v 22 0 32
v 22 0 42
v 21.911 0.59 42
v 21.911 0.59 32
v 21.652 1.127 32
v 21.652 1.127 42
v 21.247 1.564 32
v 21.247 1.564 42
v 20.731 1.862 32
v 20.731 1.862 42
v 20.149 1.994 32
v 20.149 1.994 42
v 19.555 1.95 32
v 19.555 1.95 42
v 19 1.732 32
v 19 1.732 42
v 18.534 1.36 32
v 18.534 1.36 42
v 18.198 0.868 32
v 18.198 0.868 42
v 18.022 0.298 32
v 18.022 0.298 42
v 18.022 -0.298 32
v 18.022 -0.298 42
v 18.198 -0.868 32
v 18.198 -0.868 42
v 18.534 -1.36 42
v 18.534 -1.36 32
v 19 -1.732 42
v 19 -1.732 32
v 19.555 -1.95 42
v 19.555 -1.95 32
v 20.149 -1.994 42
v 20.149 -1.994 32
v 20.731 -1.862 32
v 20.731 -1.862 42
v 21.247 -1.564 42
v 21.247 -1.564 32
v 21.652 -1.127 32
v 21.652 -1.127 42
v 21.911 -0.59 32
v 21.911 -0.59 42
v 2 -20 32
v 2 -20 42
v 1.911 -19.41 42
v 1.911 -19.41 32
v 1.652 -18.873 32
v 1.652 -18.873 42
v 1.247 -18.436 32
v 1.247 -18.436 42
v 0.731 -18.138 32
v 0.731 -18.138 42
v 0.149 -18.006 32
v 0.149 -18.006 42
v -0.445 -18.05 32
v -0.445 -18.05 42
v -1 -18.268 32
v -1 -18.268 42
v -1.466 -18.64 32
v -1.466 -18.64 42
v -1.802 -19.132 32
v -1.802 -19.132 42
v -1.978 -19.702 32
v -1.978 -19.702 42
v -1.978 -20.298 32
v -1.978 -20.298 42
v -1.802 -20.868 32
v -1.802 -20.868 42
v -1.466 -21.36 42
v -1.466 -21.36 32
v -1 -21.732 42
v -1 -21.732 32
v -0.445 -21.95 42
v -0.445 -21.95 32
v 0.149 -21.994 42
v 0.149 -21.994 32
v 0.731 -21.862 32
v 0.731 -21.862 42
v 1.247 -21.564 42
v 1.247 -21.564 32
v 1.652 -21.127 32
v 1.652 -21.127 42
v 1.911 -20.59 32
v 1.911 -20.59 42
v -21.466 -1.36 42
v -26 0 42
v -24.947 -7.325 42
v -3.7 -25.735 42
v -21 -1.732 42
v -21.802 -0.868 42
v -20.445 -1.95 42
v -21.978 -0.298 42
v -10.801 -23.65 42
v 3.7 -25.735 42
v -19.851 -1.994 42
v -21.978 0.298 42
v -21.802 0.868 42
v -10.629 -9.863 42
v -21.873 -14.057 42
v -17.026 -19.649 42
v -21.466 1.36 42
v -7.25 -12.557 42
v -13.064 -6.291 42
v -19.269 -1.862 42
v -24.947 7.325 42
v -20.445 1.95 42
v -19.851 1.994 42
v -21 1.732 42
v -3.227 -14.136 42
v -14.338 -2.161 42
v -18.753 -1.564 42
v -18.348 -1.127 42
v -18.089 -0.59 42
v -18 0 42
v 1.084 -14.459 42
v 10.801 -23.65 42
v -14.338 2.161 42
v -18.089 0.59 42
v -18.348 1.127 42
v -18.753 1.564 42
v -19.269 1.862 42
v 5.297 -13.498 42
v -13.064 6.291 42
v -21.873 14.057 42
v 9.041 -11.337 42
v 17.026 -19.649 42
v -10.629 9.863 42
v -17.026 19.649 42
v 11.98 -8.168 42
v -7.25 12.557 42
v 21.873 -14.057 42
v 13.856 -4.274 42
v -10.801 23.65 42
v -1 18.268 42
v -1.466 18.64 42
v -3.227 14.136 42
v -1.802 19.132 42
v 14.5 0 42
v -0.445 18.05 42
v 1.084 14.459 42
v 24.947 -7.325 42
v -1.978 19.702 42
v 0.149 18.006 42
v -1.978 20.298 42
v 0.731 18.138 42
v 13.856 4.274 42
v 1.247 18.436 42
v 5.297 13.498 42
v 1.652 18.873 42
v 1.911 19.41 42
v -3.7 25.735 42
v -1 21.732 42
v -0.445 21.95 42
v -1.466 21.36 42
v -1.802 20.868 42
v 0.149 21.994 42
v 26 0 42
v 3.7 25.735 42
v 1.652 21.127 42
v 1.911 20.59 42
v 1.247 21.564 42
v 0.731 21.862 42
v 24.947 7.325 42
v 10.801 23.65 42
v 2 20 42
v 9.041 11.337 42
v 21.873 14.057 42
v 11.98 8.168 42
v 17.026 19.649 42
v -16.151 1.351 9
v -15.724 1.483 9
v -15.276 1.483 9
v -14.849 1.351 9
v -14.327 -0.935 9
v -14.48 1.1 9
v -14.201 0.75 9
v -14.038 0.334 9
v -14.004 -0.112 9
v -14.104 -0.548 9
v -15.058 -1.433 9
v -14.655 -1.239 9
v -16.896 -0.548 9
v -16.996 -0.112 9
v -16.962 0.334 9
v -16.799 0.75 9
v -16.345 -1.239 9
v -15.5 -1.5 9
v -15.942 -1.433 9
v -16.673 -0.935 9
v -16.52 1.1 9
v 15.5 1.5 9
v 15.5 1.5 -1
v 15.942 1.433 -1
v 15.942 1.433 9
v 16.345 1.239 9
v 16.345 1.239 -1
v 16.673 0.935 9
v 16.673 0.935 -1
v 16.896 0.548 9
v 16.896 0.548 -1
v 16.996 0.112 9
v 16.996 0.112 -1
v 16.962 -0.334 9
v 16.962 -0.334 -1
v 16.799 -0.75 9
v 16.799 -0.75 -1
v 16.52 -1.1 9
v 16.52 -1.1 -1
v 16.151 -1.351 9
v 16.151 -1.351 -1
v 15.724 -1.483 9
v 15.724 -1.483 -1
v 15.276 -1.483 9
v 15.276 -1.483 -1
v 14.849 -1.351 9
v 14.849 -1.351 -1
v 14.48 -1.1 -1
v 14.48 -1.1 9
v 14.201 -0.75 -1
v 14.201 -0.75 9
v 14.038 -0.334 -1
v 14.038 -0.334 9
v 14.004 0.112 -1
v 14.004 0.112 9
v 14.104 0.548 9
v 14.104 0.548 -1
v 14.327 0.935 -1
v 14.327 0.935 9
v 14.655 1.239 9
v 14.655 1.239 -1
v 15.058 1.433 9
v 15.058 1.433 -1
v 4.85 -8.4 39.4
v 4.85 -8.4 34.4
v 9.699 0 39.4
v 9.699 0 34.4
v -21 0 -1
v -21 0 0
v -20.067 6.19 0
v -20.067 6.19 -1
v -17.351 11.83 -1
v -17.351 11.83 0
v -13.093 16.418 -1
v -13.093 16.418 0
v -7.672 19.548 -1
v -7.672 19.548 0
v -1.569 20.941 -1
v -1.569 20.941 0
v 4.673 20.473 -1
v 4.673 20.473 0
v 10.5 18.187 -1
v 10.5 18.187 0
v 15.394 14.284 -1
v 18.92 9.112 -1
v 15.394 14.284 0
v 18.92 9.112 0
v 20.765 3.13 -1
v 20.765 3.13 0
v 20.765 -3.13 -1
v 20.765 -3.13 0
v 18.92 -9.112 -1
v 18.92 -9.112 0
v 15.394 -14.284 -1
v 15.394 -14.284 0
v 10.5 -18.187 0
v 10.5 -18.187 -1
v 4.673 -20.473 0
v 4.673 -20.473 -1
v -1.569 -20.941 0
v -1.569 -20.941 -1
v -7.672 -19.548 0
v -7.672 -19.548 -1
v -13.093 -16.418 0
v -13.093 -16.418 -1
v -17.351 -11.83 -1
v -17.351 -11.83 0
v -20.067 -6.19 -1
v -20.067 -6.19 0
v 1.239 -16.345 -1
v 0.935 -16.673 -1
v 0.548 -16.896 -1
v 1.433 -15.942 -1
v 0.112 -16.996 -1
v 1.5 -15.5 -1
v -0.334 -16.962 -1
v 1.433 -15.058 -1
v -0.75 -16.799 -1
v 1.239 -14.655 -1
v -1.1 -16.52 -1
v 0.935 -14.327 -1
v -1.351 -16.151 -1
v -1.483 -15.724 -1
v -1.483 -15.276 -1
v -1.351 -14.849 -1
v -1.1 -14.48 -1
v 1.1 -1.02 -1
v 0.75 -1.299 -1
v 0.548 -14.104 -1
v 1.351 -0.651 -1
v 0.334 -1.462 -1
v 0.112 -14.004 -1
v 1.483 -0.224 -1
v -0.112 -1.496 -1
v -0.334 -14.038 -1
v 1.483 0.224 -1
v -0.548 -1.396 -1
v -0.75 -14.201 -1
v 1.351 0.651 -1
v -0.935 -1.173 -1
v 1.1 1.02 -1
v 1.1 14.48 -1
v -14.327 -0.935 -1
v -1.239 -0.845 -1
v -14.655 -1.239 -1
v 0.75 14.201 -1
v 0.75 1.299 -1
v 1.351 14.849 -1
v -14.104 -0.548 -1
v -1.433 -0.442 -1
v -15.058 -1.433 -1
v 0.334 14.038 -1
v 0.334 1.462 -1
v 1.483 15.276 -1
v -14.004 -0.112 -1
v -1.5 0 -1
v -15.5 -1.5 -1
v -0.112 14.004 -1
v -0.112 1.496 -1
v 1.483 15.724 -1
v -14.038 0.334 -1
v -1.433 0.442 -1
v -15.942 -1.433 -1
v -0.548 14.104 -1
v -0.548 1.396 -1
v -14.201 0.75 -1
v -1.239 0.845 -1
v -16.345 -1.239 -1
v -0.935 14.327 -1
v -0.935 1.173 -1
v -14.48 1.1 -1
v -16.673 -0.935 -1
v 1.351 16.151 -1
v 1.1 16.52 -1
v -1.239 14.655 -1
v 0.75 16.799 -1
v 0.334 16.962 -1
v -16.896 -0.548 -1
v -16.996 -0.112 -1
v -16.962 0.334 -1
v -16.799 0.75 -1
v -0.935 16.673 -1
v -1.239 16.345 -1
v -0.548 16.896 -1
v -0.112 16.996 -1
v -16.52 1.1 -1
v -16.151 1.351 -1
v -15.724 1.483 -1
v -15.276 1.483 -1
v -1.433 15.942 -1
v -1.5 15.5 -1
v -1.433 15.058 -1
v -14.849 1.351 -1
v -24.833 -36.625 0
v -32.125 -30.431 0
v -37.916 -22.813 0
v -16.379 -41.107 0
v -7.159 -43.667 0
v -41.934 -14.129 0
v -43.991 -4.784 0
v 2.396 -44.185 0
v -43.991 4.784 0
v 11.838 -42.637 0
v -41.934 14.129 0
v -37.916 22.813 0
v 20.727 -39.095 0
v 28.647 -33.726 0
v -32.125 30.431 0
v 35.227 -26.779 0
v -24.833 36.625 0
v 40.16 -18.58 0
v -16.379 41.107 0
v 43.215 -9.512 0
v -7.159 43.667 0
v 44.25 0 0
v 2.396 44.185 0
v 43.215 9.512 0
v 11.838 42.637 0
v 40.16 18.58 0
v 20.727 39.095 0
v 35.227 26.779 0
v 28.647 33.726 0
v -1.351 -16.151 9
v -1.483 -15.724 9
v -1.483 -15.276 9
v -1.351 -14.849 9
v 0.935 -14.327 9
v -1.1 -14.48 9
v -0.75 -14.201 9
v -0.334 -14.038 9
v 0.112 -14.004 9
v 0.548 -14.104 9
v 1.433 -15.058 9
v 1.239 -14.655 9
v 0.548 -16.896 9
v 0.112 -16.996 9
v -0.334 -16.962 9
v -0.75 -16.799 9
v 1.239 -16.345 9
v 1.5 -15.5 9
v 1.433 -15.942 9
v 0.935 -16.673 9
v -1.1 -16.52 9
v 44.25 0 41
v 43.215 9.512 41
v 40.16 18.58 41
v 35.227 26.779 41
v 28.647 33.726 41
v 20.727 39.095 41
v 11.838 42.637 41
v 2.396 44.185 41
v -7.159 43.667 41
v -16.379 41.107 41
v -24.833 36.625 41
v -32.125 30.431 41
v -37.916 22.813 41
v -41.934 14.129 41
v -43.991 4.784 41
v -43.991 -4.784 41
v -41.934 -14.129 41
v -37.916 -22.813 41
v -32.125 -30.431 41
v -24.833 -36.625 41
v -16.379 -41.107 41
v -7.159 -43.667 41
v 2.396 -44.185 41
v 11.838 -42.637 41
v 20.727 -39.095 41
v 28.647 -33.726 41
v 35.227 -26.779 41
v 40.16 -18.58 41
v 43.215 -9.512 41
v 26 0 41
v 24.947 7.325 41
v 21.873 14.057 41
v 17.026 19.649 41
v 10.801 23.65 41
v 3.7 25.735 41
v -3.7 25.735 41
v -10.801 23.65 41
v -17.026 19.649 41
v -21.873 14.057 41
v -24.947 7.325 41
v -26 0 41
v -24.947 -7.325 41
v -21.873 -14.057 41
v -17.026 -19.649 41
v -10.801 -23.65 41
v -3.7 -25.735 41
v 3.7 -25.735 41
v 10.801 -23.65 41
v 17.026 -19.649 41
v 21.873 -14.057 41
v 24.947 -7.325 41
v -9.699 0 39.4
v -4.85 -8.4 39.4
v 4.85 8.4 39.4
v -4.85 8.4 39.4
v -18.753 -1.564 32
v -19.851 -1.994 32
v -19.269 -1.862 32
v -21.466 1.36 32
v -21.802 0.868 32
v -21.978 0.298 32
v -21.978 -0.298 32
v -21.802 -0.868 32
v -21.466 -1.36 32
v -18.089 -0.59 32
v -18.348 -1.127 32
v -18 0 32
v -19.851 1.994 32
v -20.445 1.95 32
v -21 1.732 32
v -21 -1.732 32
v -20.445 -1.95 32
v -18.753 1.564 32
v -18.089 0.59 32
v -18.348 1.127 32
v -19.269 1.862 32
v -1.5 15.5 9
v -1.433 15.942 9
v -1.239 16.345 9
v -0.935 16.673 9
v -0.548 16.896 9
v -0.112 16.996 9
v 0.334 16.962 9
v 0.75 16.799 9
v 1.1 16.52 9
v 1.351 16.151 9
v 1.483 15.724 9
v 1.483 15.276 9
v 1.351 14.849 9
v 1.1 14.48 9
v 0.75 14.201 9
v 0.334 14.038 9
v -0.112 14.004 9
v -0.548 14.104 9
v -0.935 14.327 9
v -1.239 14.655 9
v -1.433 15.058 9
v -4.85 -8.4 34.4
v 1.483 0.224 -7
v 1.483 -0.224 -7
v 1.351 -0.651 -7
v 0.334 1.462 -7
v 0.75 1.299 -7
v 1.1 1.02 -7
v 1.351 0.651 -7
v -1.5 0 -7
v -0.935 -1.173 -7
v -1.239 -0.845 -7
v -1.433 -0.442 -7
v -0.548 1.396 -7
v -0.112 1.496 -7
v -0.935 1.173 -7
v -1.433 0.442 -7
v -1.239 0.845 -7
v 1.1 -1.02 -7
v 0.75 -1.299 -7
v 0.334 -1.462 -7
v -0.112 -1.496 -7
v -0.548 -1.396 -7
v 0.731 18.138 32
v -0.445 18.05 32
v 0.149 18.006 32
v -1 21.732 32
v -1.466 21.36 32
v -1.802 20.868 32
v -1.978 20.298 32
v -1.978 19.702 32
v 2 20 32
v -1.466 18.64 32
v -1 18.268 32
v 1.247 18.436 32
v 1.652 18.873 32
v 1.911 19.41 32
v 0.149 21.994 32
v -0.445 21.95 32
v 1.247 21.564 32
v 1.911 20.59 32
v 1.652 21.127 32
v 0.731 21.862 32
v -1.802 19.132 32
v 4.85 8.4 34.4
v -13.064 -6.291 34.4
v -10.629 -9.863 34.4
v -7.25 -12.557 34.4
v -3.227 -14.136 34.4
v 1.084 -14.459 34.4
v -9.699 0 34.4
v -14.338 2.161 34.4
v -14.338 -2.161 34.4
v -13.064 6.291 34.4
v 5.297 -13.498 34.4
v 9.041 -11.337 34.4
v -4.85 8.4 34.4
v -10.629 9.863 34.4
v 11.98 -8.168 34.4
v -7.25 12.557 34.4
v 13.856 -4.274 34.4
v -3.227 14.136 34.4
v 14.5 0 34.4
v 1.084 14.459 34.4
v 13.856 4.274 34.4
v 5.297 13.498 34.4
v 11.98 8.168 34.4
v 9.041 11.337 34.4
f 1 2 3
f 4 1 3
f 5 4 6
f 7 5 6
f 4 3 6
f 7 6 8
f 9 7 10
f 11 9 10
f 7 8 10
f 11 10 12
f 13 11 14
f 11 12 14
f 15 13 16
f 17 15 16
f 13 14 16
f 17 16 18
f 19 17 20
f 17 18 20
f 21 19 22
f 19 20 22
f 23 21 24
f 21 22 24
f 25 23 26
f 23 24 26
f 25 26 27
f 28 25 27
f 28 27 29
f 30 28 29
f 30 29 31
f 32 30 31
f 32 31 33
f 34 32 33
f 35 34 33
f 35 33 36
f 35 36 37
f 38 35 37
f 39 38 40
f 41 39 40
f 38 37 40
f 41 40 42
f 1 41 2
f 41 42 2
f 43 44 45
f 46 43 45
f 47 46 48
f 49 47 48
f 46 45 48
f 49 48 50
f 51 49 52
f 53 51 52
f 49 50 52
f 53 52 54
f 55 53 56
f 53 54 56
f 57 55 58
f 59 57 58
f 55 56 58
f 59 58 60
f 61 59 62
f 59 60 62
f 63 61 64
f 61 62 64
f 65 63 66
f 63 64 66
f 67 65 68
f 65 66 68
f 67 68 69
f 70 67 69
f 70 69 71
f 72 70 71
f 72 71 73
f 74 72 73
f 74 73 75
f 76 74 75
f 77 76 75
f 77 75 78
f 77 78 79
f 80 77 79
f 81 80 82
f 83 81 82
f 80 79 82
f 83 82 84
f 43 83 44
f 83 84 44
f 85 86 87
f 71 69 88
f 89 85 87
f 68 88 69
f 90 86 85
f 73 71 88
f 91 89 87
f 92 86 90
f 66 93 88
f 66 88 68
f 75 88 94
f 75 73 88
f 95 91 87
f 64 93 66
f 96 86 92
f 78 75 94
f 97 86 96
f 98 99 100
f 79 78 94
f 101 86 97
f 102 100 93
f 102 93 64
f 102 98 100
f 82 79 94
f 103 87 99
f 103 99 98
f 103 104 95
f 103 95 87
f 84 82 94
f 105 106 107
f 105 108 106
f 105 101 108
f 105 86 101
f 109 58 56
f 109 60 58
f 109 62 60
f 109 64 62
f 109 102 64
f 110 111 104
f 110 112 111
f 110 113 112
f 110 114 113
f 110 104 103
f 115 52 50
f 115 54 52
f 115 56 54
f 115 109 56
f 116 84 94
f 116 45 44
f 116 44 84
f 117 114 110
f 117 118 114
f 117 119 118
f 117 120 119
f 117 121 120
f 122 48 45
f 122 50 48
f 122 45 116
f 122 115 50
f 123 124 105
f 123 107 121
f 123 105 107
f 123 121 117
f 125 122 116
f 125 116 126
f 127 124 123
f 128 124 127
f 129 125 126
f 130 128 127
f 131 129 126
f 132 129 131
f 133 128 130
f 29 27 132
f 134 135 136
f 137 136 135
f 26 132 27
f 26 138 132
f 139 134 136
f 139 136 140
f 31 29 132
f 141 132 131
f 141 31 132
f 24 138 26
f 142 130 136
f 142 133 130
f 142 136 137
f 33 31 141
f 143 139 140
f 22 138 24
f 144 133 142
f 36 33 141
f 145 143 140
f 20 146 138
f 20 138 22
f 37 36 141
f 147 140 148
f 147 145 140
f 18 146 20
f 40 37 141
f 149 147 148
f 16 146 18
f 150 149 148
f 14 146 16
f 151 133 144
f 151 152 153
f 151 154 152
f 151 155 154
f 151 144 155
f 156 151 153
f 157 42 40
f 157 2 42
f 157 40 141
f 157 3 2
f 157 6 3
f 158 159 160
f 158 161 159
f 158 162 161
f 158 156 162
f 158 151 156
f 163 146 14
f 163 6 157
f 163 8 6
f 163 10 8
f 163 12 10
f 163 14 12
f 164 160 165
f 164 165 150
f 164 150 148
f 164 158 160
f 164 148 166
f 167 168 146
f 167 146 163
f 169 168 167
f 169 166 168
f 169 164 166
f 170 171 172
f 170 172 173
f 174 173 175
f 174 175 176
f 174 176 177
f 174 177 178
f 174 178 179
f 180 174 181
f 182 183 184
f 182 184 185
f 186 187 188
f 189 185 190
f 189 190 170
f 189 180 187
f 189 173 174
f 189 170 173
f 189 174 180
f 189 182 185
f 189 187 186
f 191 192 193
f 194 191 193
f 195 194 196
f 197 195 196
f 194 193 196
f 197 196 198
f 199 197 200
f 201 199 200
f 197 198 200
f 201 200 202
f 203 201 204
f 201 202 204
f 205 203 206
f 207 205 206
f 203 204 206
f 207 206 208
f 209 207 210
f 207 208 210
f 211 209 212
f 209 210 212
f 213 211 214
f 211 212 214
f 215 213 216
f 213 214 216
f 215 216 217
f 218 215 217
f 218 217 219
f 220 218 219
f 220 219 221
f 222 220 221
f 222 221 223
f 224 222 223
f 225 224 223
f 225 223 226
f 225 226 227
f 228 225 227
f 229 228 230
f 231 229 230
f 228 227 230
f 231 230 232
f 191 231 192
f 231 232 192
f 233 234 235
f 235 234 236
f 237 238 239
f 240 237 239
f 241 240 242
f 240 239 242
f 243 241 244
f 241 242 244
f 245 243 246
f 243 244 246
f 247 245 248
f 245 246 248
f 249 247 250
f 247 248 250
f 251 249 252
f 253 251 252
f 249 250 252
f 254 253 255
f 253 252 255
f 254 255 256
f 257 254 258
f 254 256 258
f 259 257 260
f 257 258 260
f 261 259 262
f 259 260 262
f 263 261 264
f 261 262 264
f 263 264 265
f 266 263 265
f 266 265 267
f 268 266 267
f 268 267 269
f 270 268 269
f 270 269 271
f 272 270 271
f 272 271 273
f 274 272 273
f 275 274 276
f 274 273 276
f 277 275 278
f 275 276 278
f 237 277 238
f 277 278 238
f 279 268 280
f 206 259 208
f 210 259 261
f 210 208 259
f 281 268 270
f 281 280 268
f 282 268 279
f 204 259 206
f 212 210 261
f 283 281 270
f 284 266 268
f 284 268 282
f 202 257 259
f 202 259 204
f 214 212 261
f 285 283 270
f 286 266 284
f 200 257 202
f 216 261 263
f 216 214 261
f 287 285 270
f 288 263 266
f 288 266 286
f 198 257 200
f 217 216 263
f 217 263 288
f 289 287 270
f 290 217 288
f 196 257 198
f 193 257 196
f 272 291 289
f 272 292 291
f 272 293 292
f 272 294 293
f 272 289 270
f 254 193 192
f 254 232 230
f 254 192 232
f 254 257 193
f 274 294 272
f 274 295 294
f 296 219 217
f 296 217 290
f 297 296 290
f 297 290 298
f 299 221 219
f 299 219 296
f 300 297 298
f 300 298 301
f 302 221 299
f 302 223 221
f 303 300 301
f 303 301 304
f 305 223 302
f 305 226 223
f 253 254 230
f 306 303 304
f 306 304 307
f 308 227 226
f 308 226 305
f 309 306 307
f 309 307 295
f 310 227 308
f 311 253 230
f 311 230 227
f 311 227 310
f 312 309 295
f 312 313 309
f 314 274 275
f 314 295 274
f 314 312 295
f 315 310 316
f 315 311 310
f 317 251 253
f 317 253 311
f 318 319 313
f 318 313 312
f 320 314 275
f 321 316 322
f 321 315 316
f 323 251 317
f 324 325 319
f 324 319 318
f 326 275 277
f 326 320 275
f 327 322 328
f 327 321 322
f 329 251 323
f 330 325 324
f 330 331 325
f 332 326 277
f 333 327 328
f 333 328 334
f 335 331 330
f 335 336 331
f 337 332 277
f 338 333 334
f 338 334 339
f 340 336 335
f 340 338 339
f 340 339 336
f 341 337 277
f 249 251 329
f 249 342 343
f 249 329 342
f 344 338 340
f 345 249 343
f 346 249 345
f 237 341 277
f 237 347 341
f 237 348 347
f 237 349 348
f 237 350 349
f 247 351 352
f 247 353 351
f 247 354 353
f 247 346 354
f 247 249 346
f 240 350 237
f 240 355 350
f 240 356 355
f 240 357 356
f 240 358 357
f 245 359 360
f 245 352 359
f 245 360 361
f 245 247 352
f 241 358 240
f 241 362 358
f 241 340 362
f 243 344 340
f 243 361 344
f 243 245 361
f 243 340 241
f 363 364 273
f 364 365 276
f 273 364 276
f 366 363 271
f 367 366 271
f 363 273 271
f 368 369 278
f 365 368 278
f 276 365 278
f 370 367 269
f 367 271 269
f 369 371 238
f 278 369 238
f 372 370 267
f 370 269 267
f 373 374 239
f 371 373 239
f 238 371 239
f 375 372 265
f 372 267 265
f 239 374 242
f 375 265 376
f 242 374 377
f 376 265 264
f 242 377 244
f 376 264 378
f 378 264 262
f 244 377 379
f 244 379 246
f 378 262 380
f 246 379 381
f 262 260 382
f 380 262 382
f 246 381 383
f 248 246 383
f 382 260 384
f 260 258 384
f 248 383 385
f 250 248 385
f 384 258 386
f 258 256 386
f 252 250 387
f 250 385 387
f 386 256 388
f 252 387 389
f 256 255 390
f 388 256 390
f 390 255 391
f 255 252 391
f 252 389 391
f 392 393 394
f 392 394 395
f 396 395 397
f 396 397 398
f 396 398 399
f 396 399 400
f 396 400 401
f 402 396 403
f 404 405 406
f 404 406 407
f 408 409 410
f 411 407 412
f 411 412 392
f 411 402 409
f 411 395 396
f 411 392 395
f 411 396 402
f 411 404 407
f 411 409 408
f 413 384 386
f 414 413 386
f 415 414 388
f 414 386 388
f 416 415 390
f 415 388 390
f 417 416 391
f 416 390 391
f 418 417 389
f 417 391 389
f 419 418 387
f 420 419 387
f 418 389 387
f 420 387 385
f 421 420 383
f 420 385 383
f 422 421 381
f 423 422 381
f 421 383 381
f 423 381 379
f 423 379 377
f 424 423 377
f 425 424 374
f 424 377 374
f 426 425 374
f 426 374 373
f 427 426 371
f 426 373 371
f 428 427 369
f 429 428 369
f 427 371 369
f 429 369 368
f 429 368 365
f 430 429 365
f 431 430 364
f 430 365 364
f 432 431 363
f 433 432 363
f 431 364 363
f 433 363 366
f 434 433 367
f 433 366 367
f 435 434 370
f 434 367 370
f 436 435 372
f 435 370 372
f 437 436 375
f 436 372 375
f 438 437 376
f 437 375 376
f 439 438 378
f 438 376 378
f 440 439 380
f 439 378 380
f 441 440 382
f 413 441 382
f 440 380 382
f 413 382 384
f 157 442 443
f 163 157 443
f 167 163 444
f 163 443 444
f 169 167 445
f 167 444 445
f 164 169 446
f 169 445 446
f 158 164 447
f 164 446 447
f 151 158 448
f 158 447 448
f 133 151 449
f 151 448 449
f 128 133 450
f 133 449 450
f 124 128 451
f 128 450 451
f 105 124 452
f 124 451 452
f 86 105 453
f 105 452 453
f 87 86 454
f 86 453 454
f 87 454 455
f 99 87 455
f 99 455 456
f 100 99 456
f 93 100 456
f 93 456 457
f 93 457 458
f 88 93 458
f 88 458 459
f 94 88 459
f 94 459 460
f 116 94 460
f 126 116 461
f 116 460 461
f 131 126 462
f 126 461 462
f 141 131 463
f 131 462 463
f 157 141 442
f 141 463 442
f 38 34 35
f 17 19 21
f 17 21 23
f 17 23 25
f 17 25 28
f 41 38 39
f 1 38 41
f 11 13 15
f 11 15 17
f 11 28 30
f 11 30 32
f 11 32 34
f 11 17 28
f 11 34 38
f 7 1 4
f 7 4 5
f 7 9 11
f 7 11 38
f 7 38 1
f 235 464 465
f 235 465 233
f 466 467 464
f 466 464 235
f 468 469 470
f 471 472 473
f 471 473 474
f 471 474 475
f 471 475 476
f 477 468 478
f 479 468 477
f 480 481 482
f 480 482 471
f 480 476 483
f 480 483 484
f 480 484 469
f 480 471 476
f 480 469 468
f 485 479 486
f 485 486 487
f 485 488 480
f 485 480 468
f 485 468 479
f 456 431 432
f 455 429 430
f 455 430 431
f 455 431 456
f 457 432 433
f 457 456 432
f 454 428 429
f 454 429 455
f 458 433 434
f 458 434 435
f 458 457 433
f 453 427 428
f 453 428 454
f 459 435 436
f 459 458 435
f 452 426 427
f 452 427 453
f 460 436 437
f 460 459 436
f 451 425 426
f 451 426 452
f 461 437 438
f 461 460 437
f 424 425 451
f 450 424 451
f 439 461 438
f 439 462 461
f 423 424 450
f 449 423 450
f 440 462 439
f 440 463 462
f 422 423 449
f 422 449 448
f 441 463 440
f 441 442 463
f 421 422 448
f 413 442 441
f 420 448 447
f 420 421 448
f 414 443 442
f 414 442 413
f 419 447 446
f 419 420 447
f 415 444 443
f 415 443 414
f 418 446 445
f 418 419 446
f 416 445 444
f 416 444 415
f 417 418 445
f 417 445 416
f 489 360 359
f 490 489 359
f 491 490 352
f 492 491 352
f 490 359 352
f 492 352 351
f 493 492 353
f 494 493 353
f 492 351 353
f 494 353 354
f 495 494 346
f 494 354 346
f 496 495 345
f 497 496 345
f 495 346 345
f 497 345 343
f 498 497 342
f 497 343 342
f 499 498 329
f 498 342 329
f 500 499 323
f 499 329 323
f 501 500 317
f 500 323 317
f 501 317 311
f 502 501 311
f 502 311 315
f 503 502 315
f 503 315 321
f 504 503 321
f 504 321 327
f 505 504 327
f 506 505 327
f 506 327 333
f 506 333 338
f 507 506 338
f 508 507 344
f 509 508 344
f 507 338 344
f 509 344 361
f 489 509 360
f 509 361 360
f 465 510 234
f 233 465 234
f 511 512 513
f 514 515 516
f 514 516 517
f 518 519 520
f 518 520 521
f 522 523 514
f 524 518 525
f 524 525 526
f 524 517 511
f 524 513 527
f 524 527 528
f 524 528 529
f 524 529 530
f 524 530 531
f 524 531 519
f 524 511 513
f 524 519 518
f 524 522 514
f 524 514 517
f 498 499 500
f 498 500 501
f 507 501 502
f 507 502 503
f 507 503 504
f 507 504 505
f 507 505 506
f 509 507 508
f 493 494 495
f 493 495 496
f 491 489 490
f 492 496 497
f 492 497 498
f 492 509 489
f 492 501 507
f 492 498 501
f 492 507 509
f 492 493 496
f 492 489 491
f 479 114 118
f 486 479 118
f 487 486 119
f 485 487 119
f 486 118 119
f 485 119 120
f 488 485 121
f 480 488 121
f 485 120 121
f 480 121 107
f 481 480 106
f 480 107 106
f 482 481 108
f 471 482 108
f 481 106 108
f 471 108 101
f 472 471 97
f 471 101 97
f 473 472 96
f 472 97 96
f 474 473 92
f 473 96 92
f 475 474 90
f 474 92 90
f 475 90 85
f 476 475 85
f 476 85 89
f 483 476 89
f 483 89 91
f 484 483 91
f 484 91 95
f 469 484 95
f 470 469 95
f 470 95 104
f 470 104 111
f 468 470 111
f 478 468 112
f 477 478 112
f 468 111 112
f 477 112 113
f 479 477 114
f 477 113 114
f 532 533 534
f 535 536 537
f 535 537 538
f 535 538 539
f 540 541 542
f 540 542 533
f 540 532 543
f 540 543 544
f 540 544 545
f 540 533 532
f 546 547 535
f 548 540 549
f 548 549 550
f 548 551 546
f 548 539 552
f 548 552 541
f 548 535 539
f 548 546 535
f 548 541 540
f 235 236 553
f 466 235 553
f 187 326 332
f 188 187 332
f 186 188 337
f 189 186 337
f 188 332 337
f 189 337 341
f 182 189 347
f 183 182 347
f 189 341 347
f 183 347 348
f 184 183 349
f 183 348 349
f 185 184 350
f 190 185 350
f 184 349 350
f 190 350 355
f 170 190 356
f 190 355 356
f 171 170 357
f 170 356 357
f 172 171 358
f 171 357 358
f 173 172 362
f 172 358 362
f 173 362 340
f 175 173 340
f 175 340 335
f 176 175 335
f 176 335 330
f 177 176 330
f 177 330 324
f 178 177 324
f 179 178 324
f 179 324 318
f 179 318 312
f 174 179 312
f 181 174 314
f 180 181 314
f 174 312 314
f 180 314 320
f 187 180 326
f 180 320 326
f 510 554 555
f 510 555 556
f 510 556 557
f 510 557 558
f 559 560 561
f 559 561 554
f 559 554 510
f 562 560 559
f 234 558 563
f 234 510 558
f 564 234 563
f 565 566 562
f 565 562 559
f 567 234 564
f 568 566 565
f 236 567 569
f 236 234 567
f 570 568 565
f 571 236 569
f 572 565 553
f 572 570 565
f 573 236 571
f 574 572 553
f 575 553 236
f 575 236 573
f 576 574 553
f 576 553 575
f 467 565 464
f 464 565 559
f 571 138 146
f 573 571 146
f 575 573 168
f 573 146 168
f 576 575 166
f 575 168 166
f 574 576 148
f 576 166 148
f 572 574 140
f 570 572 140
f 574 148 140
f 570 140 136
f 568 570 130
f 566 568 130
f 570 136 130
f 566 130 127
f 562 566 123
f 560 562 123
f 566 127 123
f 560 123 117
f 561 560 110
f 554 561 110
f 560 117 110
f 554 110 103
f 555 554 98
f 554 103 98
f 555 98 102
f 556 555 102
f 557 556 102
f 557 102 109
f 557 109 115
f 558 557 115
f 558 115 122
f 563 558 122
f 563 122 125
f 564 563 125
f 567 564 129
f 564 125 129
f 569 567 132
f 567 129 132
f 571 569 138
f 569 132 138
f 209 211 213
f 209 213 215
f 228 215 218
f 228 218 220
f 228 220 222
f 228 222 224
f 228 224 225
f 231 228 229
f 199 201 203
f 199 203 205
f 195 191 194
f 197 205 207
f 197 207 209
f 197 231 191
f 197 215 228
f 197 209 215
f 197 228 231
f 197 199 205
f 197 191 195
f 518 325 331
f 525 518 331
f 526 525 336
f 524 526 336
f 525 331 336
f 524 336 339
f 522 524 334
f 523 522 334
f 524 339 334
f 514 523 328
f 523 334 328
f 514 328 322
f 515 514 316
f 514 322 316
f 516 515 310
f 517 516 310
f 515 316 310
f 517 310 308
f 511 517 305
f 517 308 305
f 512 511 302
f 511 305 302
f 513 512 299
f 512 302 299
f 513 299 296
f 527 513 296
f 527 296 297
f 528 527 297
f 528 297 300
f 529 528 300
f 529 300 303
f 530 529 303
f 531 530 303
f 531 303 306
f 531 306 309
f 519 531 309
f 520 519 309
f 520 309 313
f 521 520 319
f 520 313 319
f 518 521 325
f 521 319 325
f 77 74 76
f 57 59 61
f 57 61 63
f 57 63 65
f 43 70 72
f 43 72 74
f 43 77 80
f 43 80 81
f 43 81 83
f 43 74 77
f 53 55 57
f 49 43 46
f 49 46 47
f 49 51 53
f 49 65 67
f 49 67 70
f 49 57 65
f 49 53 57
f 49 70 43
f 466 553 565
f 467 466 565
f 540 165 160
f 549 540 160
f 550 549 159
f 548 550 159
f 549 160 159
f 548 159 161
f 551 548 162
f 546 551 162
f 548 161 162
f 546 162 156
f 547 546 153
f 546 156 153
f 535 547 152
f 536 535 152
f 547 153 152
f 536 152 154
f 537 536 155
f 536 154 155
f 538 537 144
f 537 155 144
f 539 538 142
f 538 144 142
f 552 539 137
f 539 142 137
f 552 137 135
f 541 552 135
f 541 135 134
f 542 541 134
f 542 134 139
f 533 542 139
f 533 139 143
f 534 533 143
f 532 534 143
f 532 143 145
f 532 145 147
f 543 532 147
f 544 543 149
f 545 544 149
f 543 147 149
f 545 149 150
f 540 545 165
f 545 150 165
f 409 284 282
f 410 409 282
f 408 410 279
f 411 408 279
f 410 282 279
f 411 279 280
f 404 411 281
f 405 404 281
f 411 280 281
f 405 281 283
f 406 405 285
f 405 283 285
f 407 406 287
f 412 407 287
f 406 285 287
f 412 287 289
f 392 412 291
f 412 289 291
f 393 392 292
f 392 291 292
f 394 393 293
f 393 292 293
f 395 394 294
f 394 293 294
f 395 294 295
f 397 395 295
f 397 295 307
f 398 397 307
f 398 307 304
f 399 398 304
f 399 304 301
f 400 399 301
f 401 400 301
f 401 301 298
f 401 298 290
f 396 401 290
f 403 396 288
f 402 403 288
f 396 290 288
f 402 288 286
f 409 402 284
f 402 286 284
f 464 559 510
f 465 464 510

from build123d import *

# Parameters (mm, degrees)
SKETCH_1_R               = 44.25
EXTRUDE_1_DEPTH          = 41
SKETCH_2_R               = 26
EXTRUDE_2_DEPTH          = 1
SKETCH_3_R               = 2
CUT_EXTRUDE_1_DEPTH      = 10
SKETCH_5_R               = 21
EXTRUDE_4_DEPTH          = 1
SKETCH_6_R               = 1.5
CUT_EXTRUDE_2_DEPTH      = 10
PATTERN_CIRCULAR_1_COUNT = 4
SKETCH_7_R               = 1.5
EXTRUDE_5_DEPTH          = 6
SKETCH_8_R               = 14.5
CUT_EXTRUDE_3_DEPTH      = 7.6
EXTRUDE_6_DEPTH          = 5


with BuildPart() as part:
    # 草图1 → 凸台-拉伸1 (new body)
    with BuildSketch(Plane.XY):
        Circle(SKETCH_1_R)
    extrude(amount=EXTRUDE_1_DEPTH)

    # 草图2 → 凸台-拉伸2 (add)
    with BuildSketch(Plane.XY.offset(41)):
        Circle(SKETCH_2_R)
    extrude(amount=EXTRUDE_2_DEPTH)

    # 草图3 → 切除-拉伸1 (cut)
    with BuildSketch(Plane.XY.offset(42)):
        with Locations((0, 20)):
            Circle(SKETCH_3_R)
        with Locations((20, 0)):
            Circle(SKETCH_3_R)
        with Locations((0, -20)):
            Circle(SKETCH_3_R)
        with Locations((-20, 0)):
            Circle(SKETCH_3_R)
    extrude(amount=-CUT_EXTRUDE_1_DEPTH, mode=Mode.SUBTRACT)

    # 草图5 → 凸台-拉伸4 (add)
    with BuildSketch(Plane(origin=(0, 0, 0), x_dir=(-1, 0, 0), z_dir=(0, 0, -1))):
        Circle(SKETCH_5_R)
    extrude(amount=EXTRUDE_4_DEPTH)

    # 草图6 → 切除-拉伸2 (cut)
    with BuildSketch(Plane(origin=(0, 0, -1), x_dir=(-1, 0, 0), z_dir=(0, 0, -1))):
        with Locations((0, 15.5)):
            Circle(SKETCH_6_R)
    cut_extrude_2 = extrude(amount=-CUT_EXTRUDE_2_DEPTH, mode=Mode.SUBTRACT)

    # 阵列(圆周)1: 切除-拉伸2 ×4 about axis
    pattern_circular_1_axis = Axis((0, 0, 0), (0, 0, 1))
    for i in range(1, PATTERN_CIRCULAR_1_COUNT):
        add(cut_extrude_2.rotate(pattern_circular_1_axis, i * 360 / PATTERN_CIRCULAR_1_COUNT), mode=Mode.SUBTRACT)

    # 草图7 → 凸台-拉伸5 (add)
    with BuildSketch(Plane(origin=(0, 0, -1), x_dir=(-1, 0, 0), z_dir=(0, 0, -1))):
        Circle(SKETCH_7_R)
    extrude(amount=EXTRUDE_5_DEPTH)

    # 草图8 → 切除-拉伸3 (cut)
    with BuildSketch(Plane.XY.offset(42)):
        Circle(SKETCH_8_R)
    extrude(amount=-CUT_EXTRUDE_3_DEPTH, mode=Mode.SUBTRACT)

    # 草图9 → 凸台-拉伸6 (add)
    with BuildSketch(Plane.XY.offset(34.4)):
        Polygon((9.699484522, 0), (4.849742261, 8.4), (-4.849742261, 8.4), (-9.699484522, 0), (-4.849742261, -8.4), (4.849742261, -8.4), align=None)
    extrude(amount=EXTRUDE_6_DEPTH)


solid = part.part
